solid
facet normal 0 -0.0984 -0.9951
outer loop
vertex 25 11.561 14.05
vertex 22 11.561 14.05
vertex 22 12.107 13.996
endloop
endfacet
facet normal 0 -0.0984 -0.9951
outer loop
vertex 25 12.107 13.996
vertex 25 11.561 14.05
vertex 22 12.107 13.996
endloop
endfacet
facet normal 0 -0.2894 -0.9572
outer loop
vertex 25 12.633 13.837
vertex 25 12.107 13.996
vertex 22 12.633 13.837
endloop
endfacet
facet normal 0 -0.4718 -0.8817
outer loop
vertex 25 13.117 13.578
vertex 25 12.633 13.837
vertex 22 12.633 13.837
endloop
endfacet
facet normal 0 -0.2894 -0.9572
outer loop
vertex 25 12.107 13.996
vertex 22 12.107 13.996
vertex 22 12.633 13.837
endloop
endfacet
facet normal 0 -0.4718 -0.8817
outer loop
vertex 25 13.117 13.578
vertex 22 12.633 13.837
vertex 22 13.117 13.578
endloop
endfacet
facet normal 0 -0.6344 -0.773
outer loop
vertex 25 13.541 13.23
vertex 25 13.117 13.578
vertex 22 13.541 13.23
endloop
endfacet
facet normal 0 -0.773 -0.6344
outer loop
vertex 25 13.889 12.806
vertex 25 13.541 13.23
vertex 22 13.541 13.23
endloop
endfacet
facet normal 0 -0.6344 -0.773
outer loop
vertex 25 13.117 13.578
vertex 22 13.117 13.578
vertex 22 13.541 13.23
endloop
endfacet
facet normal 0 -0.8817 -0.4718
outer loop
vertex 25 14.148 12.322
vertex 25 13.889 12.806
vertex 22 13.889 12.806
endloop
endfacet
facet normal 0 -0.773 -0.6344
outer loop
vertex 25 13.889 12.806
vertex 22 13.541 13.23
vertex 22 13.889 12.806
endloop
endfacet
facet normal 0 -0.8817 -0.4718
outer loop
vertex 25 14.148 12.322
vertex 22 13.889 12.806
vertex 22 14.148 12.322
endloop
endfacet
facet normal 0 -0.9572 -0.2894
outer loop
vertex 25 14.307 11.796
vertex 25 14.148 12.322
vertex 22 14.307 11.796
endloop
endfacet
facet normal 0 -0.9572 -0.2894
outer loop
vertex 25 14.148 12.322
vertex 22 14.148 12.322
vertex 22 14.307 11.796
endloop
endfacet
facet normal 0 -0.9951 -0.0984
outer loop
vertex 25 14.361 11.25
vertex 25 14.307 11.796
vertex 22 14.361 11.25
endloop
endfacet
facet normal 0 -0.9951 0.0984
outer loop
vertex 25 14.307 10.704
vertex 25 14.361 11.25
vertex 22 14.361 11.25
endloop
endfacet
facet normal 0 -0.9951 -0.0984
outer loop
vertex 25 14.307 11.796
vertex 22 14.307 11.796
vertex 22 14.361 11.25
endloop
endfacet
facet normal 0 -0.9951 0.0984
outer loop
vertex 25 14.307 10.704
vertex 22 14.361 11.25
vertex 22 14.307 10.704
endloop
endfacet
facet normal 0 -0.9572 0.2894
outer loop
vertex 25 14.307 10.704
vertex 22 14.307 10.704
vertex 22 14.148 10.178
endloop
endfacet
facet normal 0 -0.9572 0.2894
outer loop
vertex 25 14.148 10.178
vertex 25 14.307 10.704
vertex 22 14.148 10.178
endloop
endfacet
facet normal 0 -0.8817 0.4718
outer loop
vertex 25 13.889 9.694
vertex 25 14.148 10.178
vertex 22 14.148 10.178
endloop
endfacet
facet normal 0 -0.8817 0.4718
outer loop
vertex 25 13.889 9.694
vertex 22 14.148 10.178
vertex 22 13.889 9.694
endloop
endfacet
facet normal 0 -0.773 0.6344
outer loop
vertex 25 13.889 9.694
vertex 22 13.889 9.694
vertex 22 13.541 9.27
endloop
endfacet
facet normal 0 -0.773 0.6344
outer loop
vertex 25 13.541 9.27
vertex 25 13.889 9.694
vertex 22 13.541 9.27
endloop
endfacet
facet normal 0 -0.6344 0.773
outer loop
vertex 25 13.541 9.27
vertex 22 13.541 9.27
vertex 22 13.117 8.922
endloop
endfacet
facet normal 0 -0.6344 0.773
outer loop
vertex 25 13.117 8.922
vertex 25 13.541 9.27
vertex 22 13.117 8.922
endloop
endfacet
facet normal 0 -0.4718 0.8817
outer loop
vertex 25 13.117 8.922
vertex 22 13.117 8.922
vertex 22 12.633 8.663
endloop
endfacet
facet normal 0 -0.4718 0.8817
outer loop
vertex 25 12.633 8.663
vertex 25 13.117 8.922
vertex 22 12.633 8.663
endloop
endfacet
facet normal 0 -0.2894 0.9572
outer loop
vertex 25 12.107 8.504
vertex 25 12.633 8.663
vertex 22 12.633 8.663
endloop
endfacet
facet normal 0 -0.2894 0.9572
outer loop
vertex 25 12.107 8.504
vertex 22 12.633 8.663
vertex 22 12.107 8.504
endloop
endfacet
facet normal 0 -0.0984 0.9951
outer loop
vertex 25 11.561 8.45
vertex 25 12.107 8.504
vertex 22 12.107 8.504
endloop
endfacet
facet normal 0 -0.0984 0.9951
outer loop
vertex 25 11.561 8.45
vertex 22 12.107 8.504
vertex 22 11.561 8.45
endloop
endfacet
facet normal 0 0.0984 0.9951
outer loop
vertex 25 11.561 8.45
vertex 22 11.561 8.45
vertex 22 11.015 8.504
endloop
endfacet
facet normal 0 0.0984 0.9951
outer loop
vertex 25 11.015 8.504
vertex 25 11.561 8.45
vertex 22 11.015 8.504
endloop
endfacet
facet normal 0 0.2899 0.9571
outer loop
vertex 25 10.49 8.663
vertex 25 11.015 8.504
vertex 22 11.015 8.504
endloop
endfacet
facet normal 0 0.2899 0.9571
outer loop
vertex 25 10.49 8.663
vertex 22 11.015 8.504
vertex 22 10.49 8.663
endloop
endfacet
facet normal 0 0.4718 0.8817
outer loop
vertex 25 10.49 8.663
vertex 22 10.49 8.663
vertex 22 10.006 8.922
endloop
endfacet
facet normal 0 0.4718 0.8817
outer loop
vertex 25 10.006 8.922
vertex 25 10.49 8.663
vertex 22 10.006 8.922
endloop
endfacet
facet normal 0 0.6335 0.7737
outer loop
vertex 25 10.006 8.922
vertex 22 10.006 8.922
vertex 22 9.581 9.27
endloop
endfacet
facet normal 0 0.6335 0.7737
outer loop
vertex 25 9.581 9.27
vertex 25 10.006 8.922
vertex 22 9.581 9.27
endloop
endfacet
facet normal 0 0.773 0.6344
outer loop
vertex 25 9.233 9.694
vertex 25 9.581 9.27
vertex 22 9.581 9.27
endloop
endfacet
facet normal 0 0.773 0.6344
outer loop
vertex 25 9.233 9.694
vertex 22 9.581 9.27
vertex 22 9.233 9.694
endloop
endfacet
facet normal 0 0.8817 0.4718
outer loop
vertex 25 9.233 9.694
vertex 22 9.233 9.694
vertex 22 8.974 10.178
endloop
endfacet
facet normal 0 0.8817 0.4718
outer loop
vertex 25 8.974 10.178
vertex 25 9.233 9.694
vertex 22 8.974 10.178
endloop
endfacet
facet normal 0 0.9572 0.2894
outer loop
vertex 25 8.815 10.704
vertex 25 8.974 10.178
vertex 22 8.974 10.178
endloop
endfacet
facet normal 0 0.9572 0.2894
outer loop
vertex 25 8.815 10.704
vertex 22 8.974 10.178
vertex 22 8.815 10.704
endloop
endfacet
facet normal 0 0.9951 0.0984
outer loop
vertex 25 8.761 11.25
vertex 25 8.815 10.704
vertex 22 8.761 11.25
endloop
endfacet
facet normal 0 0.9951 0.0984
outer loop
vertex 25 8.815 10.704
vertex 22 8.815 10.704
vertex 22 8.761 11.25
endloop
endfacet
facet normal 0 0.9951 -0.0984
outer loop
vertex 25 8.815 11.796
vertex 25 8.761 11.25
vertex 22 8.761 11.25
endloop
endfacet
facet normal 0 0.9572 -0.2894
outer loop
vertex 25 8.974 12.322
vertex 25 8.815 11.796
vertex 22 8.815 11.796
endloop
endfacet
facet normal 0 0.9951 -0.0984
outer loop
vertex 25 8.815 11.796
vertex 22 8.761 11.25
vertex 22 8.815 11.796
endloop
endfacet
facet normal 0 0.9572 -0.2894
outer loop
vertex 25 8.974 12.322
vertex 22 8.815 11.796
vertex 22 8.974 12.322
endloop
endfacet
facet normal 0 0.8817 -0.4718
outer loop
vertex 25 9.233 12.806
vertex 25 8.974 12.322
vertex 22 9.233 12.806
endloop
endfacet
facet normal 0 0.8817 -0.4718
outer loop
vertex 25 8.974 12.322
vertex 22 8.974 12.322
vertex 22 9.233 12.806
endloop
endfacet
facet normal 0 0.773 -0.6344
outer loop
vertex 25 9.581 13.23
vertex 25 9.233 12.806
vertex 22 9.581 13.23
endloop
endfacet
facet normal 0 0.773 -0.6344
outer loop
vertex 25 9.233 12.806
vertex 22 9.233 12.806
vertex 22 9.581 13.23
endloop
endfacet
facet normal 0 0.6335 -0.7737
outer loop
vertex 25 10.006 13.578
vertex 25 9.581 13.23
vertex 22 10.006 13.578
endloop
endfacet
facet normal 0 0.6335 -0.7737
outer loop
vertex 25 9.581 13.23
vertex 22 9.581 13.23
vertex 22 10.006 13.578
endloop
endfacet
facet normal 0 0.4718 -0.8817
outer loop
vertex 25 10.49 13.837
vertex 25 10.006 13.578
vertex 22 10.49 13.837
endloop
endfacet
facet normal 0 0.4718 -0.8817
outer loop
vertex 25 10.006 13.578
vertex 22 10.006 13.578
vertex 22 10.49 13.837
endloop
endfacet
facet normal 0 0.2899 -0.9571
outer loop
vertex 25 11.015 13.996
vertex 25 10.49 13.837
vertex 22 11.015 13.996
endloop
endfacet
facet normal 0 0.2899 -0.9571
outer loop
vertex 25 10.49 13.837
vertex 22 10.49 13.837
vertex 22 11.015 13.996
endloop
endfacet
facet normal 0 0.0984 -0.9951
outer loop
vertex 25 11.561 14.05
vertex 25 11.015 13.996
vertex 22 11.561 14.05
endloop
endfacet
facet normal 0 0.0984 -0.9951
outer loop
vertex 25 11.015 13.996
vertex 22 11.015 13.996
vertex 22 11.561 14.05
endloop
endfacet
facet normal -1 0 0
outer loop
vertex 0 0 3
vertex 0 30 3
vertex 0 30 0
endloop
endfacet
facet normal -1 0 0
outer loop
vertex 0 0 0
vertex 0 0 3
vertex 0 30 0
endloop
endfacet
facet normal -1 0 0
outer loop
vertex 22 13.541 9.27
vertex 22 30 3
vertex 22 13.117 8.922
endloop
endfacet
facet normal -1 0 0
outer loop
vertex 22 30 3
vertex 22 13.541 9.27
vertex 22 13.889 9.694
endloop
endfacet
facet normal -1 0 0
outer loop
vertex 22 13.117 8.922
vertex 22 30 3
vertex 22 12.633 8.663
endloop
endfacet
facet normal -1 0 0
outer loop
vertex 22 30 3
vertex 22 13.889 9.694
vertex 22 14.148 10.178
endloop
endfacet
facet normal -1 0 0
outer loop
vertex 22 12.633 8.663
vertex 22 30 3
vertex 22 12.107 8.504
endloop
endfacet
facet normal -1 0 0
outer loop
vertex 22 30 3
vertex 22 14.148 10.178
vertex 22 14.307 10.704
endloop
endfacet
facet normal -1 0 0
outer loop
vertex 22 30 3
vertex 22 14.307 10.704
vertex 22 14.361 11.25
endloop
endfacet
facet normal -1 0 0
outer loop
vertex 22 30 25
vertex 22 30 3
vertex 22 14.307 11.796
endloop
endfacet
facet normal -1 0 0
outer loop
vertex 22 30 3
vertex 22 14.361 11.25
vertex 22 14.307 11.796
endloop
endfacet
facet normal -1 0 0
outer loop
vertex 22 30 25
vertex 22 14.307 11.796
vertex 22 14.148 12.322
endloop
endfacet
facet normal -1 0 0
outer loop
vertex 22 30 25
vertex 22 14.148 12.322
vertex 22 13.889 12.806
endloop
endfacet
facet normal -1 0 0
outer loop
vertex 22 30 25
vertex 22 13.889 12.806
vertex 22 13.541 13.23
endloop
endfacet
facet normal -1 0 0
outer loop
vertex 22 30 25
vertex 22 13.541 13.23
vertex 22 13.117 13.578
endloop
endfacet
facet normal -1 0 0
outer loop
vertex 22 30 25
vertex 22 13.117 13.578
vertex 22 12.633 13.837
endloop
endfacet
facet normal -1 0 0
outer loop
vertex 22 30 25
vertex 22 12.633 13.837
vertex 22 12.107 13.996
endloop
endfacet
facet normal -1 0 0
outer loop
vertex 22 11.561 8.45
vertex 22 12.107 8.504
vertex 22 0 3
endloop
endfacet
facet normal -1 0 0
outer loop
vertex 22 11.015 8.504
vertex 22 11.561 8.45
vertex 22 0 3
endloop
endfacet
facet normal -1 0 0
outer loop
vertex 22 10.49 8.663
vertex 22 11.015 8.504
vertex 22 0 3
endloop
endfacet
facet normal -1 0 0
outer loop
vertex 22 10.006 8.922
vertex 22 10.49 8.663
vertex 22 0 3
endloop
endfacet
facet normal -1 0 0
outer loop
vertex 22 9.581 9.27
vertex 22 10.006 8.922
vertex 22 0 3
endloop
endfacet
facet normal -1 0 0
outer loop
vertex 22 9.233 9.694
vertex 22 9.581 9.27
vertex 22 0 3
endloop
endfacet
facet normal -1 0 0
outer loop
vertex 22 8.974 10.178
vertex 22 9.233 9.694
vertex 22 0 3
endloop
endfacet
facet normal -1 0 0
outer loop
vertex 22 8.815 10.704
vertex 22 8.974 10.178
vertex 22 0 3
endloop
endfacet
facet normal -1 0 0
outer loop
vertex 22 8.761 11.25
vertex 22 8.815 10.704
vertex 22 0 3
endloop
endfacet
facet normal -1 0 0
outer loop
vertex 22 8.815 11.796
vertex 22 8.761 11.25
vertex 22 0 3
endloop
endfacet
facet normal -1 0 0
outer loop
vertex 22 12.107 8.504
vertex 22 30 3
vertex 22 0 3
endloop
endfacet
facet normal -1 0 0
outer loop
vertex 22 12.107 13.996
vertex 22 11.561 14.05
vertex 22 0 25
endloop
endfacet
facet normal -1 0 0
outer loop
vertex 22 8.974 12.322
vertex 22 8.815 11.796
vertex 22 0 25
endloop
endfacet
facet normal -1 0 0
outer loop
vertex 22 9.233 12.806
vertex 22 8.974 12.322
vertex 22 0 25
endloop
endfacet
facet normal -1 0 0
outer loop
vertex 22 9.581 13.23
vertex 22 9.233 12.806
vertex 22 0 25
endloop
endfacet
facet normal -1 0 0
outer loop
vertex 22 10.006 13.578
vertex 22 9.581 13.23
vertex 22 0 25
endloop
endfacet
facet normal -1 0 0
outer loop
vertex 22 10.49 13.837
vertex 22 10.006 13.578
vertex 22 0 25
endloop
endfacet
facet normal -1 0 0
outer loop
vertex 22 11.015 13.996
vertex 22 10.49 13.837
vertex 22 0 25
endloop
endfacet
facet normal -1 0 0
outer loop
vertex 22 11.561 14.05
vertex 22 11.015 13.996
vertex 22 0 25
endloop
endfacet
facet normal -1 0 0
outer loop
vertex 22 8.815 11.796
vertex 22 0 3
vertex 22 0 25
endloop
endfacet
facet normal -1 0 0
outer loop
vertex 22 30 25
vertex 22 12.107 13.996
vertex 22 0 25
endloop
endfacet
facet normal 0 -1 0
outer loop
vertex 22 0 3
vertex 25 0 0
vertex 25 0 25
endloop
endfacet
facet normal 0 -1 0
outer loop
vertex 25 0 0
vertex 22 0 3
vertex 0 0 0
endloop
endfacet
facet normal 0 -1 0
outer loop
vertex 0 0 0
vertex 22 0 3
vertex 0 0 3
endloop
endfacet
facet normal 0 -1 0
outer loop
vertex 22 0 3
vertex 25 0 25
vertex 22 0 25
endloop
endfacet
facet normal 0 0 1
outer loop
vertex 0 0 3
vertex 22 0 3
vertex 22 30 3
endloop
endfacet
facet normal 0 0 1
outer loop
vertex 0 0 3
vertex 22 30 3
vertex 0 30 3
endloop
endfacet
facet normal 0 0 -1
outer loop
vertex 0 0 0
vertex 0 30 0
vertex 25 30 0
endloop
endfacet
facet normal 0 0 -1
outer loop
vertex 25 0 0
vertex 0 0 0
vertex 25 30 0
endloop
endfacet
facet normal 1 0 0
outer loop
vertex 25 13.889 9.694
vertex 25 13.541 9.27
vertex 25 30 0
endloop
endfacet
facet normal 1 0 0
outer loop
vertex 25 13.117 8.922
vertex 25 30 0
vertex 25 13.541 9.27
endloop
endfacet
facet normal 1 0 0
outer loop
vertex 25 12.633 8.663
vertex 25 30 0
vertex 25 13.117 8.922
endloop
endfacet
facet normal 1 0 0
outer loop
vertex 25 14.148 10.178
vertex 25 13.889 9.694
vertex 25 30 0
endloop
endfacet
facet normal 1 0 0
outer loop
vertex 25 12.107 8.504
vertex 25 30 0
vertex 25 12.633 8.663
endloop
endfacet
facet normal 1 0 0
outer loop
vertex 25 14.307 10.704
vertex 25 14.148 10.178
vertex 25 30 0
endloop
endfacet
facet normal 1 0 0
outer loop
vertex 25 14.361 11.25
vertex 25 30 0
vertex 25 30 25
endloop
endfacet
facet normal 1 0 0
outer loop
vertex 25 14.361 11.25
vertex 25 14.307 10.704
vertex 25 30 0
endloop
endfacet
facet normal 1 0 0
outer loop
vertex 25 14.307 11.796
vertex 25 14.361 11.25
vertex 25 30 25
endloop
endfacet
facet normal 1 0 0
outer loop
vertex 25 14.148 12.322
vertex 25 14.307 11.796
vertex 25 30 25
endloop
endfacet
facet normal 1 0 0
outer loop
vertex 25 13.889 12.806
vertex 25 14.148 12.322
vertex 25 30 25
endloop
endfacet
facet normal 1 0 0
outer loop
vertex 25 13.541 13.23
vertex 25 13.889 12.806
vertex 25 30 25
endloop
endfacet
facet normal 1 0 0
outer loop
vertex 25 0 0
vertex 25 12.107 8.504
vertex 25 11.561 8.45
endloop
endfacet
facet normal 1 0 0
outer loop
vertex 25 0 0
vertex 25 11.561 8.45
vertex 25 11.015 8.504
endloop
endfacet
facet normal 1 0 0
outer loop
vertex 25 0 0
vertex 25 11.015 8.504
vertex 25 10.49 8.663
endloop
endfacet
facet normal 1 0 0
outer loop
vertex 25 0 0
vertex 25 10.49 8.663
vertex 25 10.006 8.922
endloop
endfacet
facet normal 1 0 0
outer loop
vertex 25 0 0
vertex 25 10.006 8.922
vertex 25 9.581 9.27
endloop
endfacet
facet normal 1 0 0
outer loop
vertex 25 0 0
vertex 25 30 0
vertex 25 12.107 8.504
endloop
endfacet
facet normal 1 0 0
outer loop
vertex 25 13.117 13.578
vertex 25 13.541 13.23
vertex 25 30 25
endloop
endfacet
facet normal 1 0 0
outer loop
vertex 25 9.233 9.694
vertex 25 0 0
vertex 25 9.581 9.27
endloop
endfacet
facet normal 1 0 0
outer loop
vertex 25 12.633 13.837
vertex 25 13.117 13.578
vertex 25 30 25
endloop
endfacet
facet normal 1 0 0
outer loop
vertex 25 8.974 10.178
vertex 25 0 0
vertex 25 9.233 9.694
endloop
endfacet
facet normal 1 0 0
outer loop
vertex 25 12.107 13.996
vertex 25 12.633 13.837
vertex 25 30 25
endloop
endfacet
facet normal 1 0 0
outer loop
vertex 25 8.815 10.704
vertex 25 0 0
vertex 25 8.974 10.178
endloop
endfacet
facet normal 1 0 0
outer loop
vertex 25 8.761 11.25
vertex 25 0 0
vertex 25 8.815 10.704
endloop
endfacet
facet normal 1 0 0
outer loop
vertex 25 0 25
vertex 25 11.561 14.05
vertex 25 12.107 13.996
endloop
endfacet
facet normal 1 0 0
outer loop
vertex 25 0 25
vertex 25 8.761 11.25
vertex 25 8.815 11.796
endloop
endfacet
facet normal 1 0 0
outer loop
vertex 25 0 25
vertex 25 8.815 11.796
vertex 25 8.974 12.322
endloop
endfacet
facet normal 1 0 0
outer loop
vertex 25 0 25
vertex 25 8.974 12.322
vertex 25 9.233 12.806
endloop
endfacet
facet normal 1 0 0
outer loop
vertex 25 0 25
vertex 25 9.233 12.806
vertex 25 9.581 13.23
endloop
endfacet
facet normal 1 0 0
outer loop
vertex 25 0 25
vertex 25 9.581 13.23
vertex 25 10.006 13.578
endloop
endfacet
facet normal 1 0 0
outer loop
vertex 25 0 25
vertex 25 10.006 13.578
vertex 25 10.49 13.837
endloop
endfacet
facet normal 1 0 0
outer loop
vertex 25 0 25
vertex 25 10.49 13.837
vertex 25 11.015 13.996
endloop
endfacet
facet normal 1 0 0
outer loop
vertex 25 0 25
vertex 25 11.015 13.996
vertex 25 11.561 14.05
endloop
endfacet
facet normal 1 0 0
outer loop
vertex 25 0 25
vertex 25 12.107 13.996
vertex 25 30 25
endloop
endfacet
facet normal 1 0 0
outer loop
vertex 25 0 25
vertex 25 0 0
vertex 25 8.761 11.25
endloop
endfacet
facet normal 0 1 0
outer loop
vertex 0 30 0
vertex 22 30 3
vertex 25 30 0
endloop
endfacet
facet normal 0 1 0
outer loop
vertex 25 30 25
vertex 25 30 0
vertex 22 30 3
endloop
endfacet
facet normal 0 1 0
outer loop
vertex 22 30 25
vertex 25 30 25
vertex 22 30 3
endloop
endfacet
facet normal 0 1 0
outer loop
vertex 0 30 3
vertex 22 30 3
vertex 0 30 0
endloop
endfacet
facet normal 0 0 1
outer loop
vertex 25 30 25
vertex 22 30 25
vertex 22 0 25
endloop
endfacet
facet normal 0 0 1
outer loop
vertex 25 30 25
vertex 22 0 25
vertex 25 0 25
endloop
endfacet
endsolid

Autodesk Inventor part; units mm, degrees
ref_plane "YZ Plane" through (0, 0, 0) normal (1, 0, 0) x (0, 1, 0)
ref_plane "XZ Plane" through (0, 0, 0) normal (0, 1, 0) x (-1, 0, 0)
ref_plane "XY Plane" through (0, 0, 0) normal (0, 0, 1) x (1, 0, 0)
sketch "Sketch1" plane through (0, 0, 0) normal (0, 1, 0) x (-1, 0, 0)
  line L0 (0, 0) -> (-25, 0)
  line L1 (-25, 0) -> (-25, 3)
  line L2 (-25, 3) -> (0, 3)
  line L3 (0, 3) -> (0, 0)
  line L4 (-25, 0) -> (-22, 0)
  line L5 (-22, 0) -> (-22, 25)
  line L6 (-22, 25) -> (-25, 25)
  line L7 (-25, 25) -> (-25, 0)
  point P0 (0, 1.5)
  point P1 (-22, 3)
  dimension "d0" = 3
  dimension "d1" = 25
  dimension "d2" = 3
  dimension "d3" = 25
extrude "Extrusion1" add sketch "Sketch1" along normal blind 30
sketch "Sketch2" plane through (22, 0, 3) normal (-1, 0, 0) x (0, 0, 1)
  circle A0 centre (8.25, 11.5611) radius 2.8 projected
  circle A1 centre (17, 32.0611) radius 1.5 projected
  circle A2 centre (-0.5, 32.0611) radius 1.5 projected
  point P0 (-3, 0)
extrude "Extrusion2" cut sketch "Sketch2" against normal blind 30
properties part number "connector"
